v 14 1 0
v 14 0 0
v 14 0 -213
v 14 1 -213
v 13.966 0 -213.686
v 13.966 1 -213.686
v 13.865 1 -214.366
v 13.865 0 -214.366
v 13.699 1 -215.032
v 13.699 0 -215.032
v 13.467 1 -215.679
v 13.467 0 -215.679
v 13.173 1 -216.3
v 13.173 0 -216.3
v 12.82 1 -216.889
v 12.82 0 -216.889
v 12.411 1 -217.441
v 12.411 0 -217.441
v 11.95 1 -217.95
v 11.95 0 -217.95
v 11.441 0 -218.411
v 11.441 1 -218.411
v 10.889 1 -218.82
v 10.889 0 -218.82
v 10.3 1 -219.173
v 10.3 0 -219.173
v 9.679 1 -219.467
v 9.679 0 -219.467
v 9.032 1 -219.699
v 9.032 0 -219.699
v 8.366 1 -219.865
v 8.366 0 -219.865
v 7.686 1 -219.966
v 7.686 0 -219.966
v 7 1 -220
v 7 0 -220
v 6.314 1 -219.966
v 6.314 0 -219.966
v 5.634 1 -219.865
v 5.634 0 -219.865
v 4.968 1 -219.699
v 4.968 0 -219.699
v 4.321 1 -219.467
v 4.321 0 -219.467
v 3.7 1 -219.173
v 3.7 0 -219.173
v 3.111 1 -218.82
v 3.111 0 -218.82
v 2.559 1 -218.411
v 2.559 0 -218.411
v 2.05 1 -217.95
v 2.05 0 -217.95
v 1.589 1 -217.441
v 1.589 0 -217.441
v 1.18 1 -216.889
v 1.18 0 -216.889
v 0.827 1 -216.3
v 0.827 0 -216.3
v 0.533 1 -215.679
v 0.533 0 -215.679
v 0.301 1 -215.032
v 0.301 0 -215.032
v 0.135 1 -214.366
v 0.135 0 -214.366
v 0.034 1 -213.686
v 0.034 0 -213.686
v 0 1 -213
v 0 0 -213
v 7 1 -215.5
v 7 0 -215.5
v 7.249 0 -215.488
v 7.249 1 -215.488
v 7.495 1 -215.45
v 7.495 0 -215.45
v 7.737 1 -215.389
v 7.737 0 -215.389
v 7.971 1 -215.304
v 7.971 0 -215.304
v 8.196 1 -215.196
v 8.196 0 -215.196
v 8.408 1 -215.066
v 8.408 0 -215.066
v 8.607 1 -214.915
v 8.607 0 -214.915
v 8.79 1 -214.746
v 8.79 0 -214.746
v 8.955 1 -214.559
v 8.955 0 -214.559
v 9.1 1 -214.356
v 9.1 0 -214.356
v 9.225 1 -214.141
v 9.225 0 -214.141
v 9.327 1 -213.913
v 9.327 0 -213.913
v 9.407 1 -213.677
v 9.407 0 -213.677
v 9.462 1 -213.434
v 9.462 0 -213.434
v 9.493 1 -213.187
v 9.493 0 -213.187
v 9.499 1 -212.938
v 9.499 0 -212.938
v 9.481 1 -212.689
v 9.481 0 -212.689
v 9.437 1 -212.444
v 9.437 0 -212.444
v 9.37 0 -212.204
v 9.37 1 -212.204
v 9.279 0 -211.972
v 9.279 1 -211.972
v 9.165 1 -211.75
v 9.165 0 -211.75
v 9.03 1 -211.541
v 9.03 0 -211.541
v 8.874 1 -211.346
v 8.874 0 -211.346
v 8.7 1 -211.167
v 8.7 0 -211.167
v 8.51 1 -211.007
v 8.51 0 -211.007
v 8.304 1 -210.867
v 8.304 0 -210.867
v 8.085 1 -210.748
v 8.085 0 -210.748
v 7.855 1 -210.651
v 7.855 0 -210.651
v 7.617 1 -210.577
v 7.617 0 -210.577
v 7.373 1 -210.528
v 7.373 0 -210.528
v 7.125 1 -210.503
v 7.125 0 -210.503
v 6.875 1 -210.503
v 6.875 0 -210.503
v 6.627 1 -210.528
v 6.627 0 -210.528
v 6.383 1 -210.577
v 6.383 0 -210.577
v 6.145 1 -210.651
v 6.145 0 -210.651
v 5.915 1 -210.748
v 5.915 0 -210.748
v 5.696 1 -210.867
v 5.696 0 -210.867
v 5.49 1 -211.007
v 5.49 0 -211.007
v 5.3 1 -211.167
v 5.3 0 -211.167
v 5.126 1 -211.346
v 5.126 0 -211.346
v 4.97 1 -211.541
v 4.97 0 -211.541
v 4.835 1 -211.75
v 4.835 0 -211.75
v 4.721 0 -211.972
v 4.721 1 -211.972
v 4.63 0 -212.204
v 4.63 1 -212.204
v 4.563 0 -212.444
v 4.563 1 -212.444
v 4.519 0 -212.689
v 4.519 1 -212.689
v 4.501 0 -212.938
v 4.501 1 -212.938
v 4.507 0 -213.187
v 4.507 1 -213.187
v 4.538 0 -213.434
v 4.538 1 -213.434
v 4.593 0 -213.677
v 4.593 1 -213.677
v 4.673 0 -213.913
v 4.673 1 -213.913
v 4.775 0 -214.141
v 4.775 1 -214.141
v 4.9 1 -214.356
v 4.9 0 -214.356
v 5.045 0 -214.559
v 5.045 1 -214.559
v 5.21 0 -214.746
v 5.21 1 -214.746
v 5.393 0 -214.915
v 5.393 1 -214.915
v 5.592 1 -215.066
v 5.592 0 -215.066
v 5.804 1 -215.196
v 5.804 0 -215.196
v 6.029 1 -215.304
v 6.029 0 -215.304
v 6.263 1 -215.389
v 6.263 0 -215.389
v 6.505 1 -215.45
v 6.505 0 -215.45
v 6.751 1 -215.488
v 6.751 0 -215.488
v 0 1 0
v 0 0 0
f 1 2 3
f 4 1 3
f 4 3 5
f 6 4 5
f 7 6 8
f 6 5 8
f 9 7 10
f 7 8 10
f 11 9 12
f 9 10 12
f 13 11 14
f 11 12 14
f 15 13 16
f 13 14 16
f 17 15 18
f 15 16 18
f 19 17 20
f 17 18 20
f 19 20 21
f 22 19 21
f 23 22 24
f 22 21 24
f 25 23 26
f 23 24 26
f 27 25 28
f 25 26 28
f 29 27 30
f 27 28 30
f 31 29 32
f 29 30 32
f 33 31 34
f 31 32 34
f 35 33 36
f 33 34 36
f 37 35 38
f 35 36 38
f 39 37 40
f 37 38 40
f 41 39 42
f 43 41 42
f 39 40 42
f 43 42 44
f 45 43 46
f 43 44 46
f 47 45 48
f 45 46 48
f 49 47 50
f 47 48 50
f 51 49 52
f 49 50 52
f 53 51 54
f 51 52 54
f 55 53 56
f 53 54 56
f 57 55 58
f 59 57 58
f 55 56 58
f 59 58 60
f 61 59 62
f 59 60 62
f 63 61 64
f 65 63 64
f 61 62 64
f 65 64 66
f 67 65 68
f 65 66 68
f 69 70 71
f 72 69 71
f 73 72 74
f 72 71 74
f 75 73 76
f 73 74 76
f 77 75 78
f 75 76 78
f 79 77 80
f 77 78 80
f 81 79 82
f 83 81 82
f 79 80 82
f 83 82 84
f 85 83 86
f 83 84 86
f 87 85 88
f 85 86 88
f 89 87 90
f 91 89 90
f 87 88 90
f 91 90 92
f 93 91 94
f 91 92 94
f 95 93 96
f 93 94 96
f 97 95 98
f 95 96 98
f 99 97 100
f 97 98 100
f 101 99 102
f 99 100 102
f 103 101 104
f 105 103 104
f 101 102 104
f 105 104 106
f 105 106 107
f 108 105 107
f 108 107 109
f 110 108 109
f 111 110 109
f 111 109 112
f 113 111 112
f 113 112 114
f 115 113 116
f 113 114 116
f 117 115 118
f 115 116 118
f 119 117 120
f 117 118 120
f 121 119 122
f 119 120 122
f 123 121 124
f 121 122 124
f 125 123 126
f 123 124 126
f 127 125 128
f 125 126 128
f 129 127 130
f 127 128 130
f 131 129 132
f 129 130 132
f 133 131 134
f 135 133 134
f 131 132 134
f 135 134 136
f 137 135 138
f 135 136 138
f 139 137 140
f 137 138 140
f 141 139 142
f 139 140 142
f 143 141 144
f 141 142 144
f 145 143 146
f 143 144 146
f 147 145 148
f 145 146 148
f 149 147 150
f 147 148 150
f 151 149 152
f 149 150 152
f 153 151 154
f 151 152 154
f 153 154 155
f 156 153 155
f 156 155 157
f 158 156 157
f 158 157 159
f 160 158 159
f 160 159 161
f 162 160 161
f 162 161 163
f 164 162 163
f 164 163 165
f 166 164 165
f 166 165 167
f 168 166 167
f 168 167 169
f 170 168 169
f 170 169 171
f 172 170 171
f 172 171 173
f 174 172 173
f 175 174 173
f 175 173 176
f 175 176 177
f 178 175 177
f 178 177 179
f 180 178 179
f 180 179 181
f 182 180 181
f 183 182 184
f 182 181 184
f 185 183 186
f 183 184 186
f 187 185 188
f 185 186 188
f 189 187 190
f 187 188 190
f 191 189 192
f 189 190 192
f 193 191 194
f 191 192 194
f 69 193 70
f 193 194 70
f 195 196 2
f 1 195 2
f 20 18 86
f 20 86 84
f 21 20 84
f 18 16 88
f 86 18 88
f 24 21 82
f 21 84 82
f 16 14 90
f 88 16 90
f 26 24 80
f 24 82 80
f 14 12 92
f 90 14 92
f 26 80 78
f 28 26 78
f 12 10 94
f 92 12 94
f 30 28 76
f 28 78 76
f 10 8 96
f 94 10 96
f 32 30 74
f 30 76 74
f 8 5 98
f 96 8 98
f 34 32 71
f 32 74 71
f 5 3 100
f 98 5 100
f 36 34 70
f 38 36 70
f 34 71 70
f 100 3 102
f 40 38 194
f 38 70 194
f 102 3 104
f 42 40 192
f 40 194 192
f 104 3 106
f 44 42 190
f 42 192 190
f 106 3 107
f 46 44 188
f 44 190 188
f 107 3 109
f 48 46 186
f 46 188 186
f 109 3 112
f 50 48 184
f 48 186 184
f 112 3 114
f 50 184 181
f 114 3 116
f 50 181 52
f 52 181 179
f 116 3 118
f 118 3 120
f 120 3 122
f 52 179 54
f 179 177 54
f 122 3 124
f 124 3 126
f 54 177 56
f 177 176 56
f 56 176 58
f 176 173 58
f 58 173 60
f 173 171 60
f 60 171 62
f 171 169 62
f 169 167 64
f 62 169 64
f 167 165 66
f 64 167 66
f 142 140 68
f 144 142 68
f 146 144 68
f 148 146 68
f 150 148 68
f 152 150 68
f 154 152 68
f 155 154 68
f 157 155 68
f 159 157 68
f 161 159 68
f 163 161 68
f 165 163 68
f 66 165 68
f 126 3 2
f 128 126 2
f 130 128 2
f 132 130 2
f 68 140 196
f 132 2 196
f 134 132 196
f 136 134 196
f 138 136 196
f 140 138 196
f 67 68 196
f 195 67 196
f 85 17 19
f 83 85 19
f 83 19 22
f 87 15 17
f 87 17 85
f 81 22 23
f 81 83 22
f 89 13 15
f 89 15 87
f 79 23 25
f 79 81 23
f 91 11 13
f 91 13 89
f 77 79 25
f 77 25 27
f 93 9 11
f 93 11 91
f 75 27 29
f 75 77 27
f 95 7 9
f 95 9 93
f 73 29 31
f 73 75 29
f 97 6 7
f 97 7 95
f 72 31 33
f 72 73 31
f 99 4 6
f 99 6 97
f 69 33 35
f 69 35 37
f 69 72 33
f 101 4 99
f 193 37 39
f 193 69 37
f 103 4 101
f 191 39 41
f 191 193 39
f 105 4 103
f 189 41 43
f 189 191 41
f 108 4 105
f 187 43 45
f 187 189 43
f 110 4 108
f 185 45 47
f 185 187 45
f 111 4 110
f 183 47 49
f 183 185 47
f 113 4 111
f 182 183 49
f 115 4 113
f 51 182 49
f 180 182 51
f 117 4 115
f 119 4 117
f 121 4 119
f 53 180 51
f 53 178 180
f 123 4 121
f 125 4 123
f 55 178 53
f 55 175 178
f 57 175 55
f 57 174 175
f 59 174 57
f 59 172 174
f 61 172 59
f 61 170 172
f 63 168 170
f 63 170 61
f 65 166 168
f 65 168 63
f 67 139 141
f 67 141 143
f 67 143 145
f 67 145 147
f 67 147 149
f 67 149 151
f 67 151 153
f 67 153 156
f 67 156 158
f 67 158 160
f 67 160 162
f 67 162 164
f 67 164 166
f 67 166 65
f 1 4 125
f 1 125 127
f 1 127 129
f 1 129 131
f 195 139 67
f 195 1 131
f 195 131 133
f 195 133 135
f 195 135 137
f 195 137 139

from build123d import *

# Parameters (mm, degrees)
SKETCH1_W           = 14
SKETCH1_H           = 200
BOSS_EXTRUDE1_DEPTH = 1
SKETCH2_R           = 2.5
BOSS_EXTRUDE2_DEPTH = 1


with BuildPart() as part:
    # Sketch1 → Boss-Extrude1 (new body)
    with BuildSketch(Plane(origin=(0, 0, 0), x_dir=(1, 0, 0), z_dir=(0, 1, 0))):
        with Locations((7, 100)):
            Rectangle(SKETCH1_W, SKETCH1_H)
    extrude(amount=BOSS_EXTRUDE1_DEPTH)

    # Sketch2 → Boss-Extrude2 (add)
    with BuildSketch(Plane.XZ):
        with BuildLine():
            Line((0, -200), (14, -200))
            Line((14, -200), (14, -213))
            ThreePointArc((14, -213), (7, -220), (0, -213))
            Line((0, -213), (0, -200))
        make_face()
        with Locations(Location((7, -213, 0), (0, 0, 270))):
            Circle(SKETCH2_R, mode=Mode.SUBTRACT)
    extrude(amount=-BOSS_EXTRUDE2_DEPTH)


solid = part.part
